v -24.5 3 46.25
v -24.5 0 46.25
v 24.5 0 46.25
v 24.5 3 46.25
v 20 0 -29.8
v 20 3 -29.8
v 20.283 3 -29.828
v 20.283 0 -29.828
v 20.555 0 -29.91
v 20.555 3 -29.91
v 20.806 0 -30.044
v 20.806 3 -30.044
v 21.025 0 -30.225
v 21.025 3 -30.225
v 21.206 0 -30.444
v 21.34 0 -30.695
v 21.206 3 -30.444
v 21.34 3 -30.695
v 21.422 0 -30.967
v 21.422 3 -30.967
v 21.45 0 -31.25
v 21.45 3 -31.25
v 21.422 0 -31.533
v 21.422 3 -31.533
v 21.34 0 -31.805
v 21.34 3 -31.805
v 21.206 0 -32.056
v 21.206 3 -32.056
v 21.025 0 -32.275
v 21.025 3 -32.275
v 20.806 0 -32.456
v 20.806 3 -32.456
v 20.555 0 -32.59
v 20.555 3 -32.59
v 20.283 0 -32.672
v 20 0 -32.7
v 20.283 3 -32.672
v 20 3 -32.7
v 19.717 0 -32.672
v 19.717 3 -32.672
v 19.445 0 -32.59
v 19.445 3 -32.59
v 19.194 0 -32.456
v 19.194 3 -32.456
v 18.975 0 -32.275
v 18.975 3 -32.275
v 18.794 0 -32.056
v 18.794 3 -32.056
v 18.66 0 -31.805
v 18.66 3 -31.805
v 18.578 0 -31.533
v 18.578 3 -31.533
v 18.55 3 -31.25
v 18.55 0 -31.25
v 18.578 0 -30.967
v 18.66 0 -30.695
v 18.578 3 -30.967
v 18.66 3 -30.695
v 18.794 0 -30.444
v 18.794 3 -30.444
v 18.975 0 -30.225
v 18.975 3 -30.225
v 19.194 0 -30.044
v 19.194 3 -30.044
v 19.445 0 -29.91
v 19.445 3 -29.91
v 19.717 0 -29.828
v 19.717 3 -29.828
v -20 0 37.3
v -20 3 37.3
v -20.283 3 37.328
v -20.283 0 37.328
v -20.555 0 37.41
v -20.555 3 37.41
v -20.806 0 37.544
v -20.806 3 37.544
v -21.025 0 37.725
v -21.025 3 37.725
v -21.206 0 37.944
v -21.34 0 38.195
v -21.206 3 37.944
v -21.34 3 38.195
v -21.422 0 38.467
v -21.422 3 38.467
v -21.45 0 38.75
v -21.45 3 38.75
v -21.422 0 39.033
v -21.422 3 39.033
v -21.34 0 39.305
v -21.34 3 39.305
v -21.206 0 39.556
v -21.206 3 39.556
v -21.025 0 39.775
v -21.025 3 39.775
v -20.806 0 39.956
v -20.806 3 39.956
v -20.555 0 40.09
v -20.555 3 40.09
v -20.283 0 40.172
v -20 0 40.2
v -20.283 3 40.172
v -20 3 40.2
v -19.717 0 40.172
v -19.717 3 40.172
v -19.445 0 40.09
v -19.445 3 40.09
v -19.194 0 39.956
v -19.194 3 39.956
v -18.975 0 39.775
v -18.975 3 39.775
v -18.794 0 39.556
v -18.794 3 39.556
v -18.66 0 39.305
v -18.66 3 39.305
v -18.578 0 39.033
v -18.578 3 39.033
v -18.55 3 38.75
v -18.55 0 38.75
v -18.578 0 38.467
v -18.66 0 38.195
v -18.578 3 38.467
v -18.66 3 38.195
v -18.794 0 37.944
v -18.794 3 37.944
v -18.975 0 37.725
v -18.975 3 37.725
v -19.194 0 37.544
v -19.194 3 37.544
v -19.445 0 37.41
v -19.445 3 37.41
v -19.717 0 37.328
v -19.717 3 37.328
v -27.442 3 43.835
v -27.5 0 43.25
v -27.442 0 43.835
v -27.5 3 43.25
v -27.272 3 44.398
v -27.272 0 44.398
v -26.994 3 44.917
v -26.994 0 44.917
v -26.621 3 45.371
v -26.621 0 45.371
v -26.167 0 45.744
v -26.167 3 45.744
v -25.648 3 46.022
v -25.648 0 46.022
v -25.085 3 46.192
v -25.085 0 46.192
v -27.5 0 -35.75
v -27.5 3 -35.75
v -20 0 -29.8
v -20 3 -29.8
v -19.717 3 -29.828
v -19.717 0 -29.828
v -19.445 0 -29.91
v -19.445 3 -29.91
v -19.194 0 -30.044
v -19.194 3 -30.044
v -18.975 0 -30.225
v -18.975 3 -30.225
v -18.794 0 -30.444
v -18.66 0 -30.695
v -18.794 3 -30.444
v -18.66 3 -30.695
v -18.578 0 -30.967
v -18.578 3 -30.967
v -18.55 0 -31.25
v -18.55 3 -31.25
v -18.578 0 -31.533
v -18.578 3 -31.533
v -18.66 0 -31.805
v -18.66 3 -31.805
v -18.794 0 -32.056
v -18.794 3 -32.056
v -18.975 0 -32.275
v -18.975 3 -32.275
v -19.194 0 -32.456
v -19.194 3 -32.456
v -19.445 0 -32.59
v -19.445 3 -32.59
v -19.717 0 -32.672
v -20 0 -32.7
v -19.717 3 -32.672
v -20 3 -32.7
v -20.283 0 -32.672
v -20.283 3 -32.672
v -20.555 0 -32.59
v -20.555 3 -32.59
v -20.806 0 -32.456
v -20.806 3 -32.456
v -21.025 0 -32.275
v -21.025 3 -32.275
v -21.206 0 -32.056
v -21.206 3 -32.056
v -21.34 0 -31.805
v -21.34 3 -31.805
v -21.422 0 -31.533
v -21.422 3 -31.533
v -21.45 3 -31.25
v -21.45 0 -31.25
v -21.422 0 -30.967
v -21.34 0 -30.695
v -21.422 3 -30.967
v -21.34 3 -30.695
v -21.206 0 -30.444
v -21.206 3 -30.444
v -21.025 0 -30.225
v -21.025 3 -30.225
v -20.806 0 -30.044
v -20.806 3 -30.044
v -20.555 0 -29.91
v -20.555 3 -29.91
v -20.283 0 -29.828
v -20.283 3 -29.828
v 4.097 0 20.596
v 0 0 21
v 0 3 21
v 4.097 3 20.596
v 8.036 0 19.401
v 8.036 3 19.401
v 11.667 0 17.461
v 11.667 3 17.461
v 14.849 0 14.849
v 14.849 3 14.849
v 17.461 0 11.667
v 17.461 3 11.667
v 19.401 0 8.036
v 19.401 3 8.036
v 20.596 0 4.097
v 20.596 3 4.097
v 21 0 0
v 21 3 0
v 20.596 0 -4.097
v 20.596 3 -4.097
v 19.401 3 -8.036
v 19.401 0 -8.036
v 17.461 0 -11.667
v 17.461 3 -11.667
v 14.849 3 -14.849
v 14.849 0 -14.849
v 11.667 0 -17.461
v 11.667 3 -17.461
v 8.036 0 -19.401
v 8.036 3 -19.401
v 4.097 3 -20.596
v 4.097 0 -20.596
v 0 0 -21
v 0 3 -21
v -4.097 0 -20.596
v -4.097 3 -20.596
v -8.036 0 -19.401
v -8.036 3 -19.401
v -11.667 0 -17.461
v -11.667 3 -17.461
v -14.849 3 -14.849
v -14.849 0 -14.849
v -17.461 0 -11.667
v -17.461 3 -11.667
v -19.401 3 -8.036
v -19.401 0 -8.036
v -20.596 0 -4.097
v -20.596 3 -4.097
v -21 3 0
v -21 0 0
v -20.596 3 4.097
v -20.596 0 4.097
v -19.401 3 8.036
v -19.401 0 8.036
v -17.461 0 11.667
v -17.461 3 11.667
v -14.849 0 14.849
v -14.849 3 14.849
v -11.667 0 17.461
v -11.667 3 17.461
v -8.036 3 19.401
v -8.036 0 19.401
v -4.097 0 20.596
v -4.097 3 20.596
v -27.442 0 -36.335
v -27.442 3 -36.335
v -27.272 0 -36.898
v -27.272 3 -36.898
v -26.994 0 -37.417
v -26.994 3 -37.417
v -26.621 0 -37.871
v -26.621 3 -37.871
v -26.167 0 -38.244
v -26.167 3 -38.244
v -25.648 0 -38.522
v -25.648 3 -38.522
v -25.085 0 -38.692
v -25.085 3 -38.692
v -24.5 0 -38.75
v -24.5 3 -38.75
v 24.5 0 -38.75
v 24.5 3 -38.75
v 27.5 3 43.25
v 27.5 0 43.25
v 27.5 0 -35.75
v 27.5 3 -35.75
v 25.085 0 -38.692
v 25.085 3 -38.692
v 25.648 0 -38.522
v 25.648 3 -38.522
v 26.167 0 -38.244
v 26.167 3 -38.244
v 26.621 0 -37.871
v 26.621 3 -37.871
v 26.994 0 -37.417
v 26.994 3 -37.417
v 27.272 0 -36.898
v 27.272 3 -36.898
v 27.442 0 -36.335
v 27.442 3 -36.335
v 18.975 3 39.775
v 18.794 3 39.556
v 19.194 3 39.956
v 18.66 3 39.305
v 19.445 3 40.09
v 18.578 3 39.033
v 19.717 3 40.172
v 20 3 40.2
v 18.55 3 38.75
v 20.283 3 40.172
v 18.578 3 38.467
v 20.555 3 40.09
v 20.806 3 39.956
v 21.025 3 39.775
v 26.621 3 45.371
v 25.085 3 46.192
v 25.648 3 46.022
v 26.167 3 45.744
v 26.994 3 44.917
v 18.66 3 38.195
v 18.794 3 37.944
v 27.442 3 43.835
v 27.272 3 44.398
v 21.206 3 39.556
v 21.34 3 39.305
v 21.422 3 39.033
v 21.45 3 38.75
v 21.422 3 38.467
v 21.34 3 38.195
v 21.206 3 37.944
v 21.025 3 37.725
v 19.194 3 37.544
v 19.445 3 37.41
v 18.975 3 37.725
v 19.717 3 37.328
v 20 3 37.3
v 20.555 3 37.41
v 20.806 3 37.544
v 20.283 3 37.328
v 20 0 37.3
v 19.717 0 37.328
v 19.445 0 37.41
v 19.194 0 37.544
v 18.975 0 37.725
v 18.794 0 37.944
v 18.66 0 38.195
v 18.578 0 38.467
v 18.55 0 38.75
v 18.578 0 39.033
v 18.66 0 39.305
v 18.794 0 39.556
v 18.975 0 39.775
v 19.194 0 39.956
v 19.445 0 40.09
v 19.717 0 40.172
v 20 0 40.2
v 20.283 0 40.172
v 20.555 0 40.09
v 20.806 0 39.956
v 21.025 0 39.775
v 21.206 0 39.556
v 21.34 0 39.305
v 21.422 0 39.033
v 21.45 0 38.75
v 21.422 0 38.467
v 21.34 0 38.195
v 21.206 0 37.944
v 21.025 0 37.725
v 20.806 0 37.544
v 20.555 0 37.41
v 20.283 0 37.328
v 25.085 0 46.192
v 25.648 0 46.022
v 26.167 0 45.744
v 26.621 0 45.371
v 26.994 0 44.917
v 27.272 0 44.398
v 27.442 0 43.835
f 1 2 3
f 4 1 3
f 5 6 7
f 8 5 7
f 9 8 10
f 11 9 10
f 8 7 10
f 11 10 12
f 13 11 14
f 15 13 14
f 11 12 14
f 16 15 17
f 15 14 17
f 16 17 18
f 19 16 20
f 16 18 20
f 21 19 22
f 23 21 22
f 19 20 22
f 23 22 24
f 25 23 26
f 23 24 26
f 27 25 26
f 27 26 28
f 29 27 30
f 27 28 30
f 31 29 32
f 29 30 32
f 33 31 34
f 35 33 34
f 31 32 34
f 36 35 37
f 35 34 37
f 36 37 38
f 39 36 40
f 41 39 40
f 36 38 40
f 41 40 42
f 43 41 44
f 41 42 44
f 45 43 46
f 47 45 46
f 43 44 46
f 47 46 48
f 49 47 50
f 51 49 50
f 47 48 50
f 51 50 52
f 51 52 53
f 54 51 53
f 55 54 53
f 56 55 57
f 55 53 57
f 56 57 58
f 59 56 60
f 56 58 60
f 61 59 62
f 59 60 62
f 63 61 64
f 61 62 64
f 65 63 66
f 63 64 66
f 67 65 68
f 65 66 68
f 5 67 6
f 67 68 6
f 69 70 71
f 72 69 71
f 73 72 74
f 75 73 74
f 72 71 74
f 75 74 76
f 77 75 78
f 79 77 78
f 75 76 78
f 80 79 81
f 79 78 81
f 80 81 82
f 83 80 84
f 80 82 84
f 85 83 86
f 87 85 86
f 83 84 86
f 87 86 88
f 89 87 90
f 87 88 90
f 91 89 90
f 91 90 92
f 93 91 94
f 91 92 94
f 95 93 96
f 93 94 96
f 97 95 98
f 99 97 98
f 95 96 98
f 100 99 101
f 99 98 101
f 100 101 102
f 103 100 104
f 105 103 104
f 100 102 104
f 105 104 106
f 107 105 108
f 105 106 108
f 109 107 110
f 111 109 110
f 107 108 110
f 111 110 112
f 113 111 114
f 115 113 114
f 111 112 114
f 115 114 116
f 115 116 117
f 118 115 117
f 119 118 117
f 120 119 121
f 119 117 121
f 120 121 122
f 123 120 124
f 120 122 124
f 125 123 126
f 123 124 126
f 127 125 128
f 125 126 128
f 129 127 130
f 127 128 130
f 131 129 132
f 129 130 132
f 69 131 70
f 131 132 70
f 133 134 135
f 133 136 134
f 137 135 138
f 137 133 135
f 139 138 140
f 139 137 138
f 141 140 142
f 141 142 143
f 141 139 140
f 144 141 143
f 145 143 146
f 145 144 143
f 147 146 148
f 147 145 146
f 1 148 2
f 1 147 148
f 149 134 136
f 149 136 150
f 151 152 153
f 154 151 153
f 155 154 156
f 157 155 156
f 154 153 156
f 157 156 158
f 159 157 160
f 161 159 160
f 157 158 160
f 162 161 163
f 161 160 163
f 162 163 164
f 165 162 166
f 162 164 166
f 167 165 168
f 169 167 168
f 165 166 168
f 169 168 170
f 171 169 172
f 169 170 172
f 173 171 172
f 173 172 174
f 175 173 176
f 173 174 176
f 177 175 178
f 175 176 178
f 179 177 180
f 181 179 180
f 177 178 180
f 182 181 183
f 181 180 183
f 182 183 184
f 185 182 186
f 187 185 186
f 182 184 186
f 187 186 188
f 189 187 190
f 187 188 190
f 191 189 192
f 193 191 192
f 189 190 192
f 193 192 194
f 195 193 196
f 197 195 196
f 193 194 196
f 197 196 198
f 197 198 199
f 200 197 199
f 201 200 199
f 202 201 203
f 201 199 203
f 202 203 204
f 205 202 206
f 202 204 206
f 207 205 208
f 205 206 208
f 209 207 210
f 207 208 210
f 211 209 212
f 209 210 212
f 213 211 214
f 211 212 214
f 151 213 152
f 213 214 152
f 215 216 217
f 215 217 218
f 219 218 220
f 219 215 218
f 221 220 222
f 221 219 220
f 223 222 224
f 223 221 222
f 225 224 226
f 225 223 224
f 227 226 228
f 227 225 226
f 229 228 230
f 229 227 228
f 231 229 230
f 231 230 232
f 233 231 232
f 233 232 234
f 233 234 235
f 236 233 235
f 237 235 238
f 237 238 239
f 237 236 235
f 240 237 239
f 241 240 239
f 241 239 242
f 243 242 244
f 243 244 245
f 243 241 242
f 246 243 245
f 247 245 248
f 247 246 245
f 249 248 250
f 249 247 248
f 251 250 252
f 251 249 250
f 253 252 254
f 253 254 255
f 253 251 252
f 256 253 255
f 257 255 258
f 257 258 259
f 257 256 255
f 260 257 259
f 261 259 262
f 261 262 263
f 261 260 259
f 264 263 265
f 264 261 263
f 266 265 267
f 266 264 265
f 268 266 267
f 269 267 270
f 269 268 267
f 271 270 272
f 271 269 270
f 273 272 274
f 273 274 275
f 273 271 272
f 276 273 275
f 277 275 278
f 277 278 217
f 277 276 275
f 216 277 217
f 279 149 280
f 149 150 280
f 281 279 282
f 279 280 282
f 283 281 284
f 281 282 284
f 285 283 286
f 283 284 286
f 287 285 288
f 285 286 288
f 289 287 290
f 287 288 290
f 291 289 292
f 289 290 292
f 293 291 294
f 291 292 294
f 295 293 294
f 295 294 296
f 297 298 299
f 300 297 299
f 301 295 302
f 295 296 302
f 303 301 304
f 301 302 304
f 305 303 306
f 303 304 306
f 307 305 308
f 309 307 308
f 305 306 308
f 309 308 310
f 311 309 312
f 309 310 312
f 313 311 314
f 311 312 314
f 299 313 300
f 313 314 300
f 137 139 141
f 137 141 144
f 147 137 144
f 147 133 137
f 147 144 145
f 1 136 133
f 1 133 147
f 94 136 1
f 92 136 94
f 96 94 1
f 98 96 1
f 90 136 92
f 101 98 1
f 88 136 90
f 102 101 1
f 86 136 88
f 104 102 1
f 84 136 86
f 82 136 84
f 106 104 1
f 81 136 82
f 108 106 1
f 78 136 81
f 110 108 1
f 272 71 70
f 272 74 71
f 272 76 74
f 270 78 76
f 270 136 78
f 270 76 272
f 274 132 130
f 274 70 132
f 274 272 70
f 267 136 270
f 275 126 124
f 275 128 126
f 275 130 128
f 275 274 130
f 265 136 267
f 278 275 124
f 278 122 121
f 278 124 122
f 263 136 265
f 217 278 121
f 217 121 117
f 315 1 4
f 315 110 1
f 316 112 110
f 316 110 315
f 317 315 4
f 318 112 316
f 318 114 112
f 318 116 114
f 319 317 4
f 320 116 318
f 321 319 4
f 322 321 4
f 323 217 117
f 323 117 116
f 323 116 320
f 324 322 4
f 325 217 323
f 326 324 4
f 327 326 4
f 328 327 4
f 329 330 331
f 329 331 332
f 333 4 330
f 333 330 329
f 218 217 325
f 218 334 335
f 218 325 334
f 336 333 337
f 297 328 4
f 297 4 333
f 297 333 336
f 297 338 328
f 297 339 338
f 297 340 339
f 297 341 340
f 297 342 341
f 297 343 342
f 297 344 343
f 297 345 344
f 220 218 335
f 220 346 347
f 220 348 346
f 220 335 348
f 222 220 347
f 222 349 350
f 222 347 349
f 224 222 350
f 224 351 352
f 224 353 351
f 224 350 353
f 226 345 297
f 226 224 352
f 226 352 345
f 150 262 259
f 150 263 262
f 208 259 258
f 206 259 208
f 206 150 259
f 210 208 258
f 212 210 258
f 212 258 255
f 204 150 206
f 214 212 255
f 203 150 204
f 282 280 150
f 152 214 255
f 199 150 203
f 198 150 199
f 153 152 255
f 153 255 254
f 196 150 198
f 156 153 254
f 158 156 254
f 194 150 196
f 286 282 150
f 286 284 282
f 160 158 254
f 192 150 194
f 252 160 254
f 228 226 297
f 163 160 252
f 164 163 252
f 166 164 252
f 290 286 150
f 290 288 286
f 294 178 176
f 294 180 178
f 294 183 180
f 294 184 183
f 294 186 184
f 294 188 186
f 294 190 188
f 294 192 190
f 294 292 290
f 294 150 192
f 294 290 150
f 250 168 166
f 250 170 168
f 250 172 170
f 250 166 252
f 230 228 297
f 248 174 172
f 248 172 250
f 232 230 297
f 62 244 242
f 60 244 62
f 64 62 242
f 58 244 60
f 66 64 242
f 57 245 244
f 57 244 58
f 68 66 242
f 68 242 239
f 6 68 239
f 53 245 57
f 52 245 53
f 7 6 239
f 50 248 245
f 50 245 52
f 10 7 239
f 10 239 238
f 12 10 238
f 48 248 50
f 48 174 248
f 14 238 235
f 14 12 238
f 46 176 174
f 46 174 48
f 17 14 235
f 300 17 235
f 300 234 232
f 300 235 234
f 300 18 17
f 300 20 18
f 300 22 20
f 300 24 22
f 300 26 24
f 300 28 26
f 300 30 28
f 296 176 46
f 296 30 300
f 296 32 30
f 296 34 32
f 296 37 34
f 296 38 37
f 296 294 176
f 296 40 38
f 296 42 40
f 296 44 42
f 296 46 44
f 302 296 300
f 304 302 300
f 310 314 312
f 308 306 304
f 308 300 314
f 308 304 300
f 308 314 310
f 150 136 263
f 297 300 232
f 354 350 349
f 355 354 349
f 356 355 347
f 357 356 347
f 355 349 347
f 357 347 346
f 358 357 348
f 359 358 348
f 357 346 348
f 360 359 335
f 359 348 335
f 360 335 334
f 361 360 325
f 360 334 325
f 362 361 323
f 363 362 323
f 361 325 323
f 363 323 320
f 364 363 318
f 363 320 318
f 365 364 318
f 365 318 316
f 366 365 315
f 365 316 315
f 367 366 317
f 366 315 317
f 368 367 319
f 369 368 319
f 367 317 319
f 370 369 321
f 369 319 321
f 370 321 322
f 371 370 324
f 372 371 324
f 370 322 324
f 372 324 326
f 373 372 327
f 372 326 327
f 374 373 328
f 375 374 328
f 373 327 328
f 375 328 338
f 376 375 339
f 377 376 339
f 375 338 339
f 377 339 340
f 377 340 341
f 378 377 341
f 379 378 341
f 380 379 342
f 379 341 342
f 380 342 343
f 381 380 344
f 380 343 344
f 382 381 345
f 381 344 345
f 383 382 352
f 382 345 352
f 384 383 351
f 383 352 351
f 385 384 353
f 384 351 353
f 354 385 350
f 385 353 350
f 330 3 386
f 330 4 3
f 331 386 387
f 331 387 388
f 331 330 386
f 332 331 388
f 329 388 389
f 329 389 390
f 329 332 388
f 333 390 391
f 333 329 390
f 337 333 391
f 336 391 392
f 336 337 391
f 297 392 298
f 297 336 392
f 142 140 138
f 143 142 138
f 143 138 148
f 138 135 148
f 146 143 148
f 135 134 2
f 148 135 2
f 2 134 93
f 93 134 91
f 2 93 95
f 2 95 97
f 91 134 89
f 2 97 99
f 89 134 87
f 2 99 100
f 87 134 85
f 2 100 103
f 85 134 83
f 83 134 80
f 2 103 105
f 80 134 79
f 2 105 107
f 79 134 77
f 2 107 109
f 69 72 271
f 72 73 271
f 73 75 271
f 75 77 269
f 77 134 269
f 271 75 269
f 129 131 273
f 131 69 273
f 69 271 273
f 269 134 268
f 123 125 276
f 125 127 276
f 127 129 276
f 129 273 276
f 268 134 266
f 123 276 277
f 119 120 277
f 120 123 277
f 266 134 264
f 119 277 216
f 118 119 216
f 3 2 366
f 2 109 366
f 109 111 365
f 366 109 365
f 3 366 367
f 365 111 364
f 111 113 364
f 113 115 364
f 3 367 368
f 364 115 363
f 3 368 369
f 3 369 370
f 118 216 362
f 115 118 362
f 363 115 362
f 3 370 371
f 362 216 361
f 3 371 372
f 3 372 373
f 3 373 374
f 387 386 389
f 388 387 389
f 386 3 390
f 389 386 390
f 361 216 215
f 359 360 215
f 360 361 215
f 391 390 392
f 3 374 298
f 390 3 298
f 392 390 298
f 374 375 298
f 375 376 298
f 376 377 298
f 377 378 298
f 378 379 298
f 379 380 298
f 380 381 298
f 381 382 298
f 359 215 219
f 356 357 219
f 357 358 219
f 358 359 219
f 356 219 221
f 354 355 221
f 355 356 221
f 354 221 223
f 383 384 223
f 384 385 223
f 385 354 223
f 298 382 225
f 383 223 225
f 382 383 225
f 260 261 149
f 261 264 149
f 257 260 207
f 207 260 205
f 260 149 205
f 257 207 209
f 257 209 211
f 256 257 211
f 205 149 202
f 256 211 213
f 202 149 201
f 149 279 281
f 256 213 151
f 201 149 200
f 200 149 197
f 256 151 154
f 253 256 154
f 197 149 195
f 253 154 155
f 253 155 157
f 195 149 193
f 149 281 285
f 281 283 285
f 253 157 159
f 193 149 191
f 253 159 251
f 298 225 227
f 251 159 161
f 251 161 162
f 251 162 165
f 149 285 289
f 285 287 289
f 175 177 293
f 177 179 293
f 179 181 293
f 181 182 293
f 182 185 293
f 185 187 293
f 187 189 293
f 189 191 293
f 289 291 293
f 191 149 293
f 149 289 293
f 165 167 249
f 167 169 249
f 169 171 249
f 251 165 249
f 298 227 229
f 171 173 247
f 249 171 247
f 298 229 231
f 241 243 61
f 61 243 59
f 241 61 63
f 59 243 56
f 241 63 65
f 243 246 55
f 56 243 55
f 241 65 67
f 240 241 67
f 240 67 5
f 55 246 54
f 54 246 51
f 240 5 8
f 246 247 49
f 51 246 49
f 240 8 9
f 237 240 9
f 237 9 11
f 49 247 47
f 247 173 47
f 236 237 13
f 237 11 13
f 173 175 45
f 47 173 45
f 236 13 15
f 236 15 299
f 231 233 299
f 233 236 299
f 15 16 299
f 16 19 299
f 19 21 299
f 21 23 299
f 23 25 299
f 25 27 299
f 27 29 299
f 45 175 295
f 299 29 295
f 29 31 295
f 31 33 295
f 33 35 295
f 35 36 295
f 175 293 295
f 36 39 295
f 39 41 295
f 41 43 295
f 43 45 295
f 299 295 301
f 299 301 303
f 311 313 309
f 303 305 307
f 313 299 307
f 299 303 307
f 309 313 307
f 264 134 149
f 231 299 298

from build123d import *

# Parameters (mm, degrees)
SKETCH_1_W          = 55
SKETCH_1_H          = 85
SKETCH_1_R          = 21
EXTRUDE_1_DEPTH     = 3
SKETCH_2_R          = 1.45
CUT_EXTRUDE_1_DEPTH = 3
FILLET_1_R          = 3


with BuildPart() as part:
    # 草图1 → 凸台-拉伸1 (new body)
    with BuildSketch(Plane(origin=(0, 0, 0), x_dir=(1, 0, 0), z_dir=(0, 1, 0))):
        with Locations((0, -3.75)):
            Rectangle(SKETCH_1_W, SKETCH_1_H)
        with Locations(Location((0, 0, 0), (0, 0, 270))):
            Circle(SKETCH_1_R, mode=Mode.SUBTRACT)
    extrude(amount=EXTRUDE_1_DEPTH)

    # 草图2 → 切除-拉伸1 (cut)
    with BuildSketch(Plane(origin=(0, 3, 0), x_dir=(1, 0, 0), z_dir=(0, 1, 0))):
        with Locations(Location((-20, 31.25, 0), (0, 0, 270))):
            Circle(SKETCH_2_R)
        with Locations(Location((20, 31.25, 0), (0, 0, 270))):
            Circle(SKETCH_2_R)
        with Locations(Location((-20, -38.75, 0), (0, 0, 90))):
            Circle(SKETCH_2_R)
        with Locations(Location((20, -38.75, 0), (0, 0, 90))):
            Circle(SKETCH_2_R)
    extrude(amount=-CUT_EXTRUDE_1_DEPTH, mode=Mode.SUBTRACT)

    # 圆角1
    fillet_1_edges = [part.edges().sort_by_distance(p)[0] for p in [
        (27.5, 1.5, 46.25),
        (-27.5, 1.5, 46.25),
        (-27.5, 1.5, -38.75),
        (27.5, 1.5, -38.75),
    ]]
    fillet(fillet_1_edges, radius=FILLET_1_R)


solid = part.part
